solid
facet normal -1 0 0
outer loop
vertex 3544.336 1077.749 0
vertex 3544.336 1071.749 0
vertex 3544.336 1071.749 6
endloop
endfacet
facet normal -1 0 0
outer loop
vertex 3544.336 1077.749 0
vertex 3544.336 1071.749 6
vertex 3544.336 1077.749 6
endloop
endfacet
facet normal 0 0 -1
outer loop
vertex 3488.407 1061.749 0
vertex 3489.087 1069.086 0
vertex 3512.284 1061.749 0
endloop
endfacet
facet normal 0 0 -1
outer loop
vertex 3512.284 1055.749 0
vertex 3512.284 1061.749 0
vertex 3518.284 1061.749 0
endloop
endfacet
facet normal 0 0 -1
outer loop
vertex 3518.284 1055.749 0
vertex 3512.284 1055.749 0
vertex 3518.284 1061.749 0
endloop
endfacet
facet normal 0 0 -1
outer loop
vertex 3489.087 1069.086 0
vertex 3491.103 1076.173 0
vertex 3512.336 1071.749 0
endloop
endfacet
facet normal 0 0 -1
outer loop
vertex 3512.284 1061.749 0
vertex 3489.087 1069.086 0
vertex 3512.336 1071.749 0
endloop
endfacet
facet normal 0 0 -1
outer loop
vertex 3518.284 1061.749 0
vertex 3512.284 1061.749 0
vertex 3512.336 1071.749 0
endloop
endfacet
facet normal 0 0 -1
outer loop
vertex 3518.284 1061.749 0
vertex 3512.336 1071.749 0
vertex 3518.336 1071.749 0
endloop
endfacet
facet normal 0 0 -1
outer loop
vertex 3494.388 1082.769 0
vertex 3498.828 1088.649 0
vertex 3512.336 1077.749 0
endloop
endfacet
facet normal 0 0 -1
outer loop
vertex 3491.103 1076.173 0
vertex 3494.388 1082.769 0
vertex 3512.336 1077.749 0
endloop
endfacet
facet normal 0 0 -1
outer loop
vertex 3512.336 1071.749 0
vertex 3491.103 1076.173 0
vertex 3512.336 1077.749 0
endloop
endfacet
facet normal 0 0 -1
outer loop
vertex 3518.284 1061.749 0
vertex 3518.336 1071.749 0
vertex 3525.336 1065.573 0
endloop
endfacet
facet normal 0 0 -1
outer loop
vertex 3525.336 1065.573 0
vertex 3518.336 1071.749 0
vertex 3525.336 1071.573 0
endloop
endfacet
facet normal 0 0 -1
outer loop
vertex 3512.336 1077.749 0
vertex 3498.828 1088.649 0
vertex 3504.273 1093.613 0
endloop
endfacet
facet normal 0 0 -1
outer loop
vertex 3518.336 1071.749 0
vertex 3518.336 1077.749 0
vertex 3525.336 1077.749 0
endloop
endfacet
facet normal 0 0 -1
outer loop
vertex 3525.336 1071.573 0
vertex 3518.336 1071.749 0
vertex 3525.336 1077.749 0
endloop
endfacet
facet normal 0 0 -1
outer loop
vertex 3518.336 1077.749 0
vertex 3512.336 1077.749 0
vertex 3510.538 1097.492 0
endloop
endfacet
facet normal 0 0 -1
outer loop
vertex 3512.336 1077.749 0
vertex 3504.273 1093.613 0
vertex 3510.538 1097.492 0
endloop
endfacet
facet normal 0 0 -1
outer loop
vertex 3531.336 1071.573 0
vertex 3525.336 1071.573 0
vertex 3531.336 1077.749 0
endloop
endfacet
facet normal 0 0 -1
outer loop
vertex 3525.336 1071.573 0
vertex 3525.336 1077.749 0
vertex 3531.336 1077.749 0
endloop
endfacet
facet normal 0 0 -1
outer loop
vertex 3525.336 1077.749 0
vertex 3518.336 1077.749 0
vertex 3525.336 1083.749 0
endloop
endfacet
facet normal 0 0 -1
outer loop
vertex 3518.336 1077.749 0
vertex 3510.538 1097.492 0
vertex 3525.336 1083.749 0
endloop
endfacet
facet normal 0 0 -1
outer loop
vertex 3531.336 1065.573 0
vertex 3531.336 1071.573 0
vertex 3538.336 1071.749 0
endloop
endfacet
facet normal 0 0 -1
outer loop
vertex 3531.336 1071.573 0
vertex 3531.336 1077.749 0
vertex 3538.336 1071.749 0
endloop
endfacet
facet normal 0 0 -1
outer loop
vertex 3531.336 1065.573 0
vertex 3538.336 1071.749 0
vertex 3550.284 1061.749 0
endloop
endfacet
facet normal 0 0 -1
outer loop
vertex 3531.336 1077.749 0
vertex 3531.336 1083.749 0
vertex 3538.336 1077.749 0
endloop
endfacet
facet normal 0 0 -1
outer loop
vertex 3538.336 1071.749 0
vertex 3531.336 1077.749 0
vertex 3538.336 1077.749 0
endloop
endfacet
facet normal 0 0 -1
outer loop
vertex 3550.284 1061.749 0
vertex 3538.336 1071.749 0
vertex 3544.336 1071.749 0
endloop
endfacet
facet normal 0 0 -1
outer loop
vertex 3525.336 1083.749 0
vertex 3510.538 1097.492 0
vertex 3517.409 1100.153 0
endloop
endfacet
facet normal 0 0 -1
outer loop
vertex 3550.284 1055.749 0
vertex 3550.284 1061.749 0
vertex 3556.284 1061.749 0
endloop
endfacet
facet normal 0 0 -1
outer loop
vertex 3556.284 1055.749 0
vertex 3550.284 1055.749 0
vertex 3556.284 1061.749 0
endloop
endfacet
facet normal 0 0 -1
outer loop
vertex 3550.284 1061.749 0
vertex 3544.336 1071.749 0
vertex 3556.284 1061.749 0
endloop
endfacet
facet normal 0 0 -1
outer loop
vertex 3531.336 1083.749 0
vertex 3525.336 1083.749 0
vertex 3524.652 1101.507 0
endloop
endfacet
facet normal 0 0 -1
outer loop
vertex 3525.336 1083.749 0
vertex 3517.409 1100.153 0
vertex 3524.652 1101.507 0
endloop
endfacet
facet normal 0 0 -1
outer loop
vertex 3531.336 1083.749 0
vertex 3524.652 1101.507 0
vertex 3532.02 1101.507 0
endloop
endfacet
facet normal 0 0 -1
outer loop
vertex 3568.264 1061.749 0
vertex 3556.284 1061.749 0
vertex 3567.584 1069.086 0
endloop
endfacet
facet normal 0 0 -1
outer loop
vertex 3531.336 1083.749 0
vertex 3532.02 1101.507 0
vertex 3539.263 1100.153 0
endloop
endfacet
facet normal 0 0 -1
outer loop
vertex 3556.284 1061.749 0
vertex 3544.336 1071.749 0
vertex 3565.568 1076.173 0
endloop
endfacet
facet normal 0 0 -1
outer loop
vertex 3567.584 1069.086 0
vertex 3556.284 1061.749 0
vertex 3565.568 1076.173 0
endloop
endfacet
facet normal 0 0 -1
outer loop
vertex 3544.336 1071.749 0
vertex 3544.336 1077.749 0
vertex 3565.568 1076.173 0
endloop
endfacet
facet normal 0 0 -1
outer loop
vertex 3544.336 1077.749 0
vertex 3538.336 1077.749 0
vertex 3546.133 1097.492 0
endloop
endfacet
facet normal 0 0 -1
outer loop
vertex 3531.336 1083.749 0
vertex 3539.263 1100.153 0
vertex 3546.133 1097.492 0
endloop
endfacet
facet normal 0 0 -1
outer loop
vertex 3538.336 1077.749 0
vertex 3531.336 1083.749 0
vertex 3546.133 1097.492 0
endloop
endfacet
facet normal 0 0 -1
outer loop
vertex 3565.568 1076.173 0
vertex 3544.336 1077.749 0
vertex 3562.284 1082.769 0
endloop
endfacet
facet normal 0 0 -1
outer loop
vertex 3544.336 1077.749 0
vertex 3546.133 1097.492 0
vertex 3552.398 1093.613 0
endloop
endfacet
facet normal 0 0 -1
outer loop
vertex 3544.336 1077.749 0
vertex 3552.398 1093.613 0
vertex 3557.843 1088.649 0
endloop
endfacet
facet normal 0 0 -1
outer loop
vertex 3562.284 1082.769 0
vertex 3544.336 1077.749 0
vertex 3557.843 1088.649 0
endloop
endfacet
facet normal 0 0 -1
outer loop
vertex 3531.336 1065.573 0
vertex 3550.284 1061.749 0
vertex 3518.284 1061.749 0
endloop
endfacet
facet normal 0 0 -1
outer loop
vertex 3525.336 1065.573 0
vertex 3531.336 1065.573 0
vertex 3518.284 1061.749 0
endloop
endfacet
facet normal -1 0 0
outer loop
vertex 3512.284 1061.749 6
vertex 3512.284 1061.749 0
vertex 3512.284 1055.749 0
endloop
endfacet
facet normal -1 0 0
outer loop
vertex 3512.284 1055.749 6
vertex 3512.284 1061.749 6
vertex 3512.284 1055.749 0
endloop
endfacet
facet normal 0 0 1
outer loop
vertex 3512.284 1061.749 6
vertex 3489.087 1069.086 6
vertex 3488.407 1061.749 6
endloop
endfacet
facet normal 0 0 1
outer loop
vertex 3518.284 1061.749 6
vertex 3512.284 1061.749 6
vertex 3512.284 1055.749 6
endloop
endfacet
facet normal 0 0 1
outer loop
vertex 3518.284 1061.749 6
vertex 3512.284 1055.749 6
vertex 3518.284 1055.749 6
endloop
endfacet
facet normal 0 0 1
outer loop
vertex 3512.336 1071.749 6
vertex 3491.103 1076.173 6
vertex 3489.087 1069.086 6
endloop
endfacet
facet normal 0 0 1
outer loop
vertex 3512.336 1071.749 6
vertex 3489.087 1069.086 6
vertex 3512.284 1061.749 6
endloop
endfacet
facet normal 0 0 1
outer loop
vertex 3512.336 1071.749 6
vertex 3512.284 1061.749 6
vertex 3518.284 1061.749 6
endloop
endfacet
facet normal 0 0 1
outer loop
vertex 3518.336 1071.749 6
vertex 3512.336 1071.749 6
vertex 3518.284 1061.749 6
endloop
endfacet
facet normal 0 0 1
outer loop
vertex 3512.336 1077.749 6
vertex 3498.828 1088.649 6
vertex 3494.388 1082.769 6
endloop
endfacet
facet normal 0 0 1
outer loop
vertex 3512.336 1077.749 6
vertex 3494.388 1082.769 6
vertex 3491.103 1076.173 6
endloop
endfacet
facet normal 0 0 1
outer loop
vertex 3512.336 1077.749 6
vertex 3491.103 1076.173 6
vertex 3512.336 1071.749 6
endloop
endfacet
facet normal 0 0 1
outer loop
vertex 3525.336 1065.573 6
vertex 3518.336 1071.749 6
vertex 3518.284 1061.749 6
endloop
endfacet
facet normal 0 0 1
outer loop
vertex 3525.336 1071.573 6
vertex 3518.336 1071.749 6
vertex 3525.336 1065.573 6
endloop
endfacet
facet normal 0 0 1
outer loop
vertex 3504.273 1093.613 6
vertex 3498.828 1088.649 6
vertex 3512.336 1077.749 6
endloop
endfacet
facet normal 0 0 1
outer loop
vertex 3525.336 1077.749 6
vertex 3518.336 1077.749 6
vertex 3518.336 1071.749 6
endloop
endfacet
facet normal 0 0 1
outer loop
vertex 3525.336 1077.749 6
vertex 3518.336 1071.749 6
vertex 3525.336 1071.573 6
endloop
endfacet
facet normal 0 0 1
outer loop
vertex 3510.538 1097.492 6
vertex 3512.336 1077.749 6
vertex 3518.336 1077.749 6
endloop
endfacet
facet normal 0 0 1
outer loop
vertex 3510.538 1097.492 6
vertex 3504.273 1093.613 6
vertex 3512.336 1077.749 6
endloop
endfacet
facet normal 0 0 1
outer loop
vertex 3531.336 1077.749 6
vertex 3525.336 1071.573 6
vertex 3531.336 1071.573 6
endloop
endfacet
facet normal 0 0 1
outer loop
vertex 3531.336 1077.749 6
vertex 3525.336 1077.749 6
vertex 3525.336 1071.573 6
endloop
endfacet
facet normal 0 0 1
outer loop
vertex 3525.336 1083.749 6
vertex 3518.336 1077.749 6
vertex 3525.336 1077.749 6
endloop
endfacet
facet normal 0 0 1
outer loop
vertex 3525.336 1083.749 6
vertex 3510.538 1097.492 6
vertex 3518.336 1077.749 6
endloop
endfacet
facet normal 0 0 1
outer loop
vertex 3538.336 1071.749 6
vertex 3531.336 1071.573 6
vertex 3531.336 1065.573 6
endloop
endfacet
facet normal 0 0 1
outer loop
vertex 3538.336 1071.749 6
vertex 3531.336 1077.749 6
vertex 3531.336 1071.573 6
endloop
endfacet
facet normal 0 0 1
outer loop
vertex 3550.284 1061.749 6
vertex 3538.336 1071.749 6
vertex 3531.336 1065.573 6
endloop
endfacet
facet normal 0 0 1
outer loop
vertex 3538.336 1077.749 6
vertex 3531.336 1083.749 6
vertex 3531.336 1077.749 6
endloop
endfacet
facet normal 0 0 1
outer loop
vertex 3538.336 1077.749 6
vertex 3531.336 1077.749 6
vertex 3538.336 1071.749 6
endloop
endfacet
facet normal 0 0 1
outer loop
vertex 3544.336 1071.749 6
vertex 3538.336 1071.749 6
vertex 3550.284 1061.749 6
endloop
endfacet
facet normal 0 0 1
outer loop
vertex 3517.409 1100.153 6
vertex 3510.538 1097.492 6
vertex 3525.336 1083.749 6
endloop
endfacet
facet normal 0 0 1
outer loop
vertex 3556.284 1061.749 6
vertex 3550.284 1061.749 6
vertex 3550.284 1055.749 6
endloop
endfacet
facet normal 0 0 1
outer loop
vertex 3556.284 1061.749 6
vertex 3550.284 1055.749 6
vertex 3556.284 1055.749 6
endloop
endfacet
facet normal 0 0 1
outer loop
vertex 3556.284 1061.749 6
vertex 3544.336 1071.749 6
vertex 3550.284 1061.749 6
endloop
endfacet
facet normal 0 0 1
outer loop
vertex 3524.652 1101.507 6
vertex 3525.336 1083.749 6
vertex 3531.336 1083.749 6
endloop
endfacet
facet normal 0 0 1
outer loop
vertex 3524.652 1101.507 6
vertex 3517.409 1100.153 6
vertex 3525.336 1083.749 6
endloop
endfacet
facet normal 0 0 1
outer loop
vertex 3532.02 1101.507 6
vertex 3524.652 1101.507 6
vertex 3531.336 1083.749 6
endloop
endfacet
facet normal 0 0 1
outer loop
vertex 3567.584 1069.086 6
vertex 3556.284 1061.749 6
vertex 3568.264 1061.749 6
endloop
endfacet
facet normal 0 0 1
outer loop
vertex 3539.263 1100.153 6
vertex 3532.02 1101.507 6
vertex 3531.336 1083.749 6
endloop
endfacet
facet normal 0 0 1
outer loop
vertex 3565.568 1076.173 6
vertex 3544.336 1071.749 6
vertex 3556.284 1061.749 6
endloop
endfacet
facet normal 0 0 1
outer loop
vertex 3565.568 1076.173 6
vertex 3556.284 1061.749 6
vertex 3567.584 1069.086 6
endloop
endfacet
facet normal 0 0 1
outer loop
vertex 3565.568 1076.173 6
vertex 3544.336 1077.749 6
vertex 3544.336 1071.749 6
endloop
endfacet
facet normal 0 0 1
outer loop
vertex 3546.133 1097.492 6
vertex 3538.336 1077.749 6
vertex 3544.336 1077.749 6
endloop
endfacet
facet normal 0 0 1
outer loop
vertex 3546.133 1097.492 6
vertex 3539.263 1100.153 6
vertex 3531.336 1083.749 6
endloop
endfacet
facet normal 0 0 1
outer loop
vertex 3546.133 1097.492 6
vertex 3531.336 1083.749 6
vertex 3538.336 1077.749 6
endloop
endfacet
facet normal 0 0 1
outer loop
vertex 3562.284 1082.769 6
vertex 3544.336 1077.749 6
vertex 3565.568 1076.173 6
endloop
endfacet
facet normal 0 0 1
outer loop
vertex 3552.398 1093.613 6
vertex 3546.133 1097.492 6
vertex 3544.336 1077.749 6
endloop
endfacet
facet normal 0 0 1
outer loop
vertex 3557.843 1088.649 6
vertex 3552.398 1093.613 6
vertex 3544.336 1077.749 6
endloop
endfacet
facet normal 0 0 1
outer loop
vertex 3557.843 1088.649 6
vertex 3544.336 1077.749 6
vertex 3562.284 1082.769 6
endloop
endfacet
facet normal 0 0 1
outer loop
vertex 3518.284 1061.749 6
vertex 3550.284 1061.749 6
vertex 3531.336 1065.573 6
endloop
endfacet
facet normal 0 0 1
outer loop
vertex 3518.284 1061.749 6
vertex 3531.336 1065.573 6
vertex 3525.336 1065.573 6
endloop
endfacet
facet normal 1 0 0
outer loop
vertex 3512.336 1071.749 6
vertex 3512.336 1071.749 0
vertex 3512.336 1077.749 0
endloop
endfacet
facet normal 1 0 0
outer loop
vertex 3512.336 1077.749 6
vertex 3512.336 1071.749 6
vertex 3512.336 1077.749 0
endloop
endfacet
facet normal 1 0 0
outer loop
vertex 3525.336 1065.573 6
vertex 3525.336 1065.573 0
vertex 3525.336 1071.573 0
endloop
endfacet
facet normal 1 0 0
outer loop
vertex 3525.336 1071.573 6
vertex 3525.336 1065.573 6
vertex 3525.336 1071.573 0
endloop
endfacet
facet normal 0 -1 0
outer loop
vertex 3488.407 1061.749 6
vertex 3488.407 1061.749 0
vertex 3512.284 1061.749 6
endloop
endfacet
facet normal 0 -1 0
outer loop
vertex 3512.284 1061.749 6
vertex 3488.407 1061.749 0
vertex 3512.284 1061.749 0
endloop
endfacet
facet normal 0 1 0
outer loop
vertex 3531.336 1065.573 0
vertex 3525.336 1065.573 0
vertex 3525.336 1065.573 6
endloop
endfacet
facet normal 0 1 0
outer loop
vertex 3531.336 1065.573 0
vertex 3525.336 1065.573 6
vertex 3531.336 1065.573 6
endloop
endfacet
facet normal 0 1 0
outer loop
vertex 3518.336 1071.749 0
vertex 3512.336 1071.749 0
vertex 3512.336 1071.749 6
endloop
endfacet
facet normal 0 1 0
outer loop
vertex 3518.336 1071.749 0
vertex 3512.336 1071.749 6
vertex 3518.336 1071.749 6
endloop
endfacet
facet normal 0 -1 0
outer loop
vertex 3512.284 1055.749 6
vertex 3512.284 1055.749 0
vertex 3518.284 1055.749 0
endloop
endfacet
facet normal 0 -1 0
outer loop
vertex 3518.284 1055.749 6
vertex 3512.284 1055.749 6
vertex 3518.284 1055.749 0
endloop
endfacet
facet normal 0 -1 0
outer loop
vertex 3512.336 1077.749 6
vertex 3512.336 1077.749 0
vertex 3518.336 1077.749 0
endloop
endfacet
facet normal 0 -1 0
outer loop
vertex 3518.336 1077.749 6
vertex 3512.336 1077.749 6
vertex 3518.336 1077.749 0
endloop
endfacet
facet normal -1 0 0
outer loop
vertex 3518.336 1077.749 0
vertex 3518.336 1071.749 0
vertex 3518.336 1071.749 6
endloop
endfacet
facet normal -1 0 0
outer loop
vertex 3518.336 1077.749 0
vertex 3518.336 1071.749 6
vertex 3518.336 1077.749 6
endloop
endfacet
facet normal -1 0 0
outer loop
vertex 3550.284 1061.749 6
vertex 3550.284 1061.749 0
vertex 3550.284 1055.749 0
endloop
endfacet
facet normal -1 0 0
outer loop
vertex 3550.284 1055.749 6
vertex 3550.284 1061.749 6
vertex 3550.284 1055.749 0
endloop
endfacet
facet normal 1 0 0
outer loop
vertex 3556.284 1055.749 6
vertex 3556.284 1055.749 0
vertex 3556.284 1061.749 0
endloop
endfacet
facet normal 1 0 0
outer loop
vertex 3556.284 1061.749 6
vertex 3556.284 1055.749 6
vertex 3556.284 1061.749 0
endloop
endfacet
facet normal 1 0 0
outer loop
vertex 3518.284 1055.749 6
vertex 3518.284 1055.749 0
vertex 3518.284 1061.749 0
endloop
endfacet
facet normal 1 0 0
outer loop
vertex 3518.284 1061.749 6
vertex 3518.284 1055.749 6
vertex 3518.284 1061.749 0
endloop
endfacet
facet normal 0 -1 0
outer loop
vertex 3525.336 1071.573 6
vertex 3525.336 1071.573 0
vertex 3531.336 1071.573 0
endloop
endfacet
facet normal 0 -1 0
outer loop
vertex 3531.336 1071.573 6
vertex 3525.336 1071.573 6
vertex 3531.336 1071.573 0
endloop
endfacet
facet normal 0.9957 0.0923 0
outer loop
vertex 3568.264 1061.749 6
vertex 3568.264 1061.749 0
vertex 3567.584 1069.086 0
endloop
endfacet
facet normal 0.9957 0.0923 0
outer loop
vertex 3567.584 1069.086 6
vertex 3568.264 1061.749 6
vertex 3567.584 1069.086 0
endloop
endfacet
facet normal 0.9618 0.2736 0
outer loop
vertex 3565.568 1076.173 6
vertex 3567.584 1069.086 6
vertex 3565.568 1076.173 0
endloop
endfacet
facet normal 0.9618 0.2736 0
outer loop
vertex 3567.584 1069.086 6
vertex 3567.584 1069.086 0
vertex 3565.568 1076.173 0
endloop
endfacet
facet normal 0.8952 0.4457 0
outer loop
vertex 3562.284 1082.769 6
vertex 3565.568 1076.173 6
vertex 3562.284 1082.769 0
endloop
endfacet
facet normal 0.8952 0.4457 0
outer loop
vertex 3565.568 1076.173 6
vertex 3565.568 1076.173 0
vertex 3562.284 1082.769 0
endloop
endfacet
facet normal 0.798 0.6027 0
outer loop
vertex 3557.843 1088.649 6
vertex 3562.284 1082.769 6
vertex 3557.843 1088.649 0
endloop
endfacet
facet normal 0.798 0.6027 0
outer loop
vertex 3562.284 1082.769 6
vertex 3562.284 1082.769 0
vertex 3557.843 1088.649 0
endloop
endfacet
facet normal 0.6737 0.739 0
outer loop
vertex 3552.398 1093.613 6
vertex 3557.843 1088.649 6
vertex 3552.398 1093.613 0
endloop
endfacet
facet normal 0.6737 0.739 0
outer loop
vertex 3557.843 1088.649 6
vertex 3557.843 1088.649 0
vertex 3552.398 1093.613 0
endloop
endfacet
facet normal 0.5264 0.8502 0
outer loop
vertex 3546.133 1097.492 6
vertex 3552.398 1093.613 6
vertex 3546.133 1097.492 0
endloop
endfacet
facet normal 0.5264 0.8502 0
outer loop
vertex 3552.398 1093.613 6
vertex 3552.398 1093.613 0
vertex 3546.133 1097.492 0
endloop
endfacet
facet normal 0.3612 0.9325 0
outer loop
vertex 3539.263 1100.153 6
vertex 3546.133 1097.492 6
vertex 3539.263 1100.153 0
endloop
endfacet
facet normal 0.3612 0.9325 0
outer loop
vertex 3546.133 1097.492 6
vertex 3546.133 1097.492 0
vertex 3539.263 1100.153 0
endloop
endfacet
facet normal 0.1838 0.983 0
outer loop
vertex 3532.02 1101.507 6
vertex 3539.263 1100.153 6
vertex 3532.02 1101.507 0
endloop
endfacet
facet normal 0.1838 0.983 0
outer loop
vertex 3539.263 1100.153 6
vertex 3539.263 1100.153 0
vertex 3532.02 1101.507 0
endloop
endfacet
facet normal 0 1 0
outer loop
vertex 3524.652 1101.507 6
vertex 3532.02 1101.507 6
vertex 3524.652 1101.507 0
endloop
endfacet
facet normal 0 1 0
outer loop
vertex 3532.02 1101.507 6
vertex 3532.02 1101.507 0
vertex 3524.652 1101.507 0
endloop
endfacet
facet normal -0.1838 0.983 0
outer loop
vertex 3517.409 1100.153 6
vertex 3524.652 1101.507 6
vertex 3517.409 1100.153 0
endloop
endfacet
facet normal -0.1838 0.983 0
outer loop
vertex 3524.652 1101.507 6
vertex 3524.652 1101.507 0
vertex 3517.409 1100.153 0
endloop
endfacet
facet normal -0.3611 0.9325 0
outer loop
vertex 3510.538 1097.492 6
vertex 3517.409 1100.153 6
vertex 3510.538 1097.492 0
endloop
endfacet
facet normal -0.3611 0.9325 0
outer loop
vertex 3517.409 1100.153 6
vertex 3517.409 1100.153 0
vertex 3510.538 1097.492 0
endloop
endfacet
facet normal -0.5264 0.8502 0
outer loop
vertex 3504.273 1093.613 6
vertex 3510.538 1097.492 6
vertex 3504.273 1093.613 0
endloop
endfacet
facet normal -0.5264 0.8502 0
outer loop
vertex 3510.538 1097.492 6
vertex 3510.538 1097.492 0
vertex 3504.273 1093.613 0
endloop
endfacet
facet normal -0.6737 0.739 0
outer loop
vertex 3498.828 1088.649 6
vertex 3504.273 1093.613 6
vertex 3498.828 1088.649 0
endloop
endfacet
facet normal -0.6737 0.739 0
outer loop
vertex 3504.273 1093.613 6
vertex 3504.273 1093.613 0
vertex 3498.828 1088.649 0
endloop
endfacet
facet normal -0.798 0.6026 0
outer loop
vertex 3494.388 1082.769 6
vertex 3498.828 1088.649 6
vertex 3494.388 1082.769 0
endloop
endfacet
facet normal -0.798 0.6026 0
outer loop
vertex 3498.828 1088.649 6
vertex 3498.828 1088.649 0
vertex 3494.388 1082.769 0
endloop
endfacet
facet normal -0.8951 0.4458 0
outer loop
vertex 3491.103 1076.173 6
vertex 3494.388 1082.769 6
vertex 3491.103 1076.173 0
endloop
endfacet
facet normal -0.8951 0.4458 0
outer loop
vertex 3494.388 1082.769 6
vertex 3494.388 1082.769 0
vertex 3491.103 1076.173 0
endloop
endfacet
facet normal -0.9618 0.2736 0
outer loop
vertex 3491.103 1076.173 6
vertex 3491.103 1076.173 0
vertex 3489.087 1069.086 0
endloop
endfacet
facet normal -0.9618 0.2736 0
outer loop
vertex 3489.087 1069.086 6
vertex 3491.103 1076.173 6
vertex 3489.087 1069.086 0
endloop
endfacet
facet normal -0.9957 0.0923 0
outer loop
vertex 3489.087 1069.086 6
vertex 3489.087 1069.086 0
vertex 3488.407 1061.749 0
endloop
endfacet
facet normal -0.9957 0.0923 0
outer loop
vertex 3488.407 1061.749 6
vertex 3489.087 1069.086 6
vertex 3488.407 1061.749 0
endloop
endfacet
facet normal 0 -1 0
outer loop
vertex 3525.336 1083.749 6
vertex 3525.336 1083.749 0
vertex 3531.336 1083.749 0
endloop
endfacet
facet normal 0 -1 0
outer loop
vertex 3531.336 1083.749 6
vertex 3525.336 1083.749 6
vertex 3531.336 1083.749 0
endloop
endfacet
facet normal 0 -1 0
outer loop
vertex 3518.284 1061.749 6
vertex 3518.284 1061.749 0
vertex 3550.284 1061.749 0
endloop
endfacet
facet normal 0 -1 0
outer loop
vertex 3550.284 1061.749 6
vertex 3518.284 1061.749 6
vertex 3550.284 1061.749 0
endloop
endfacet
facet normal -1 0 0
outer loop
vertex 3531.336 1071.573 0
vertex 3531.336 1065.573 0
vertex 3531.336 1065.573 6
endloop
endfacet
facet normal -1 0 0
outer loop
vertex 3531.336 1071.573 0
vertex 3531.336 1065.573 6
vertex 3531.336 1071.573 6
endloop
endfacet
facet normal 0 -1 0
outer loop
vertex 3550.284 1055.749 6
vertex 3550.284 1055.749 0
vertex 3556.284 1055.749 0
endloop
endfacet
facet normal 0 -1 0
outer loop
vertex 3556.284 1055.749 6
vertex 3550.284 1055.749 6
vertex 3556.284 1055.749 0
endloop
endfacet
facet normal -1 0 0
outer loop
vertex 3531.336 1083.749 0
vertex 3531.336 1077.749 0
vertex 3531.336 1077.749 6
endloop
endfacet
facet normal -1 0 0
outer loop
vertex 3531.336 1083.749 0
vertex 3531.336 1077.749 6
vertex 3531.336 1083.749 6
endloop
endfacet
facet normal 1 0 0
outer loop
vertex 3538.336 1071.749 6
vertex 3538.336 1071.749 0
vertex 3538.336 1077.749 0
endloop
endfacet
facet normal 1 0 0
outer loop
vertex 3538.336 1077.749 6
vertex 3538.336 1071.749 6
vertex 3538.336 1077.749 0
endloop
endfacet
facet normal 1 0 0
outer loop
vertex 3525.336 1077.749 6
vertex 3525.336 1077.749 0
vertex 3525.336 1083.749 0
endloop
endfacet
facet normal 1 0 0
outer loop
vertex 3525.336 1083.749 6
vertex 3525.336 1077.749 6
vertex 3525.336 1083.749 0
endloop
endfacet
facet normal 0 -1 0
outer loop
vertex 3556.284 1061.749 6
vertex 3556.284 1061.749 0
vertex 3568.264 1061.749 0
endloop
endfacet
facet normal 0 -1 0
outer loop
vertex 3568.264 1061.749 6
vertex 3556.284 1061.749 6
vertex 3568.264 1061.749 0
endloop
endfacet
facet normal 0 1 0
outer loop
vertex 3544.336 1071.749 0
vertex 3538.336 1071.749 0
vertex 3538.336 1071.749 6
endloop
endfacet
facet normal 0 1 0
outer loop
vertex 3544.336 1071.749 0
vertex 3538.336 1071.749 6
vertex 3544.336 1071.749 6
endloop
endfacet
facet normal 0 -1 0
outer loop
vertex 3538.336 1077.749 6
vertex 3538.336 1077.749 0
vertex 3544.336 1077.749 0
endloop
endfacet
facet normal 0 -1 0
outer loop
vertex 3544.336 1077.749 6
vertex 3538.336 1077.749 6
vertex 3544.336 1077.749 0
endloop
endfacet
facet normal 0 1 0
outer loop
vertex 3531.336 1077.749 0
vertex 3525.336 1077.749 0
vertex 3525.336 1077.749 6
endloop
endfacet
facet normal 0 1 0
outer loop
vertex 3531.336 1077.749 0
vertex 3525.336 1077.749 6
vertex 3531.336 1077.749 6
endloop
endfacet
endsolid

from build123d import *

# Parameters (mm, degrees)
MODEL_W             = 6
MODEL_H             = 6
BOSS_EXTRUDE1_DEPTH = 6


with BuildPart() as part:
    # Model → Boss-Extrude1 (new body)
    with BuildSketch(Plane.XY):
        with BuildLine():
            Line((3550.284318909, 1061.748947436), (3550.284318909, 1055.748947436))
            Line((3550.284318909, 1055.748947436), (3556.284318909, 1055.748947436))
            Line((3556.284318909, 1055.748947436), (3556.284318909, 1061.748947436))
            Line((3556.284318909, 1061.748947436), (3568.264255366, 1061.748947436))
            ThreePointArc((3568.264255366, 1061.748947436), (3528.335683937, 1101.677518865), (3488.407112509, 1061.748947436))
            Line((3488.407112509, 1061.748947436), (3512.284318909, 1061.748947436))
            Line((3512.284318909, 1061.748947436), (3512.284318909, 1055.748947436))
            Line((3512.284318909, 1055.748947436), (3518.284318909, 1055.748947436))
            Line((3518.284318909, 1055.748947436), (3518.284318909, 1061.748947436))
            Line((3518.284318909, 1061.748947436), (3550.284318909, 1061.748947436))
        make_face()
        with Locations((3541.335683937, 1074.748947436)):
            Rectangle(MODEL_W, MODEL_H, mode=Mode.SUBTRACT)
        with Locations((3515.335683937, 1074.748947436)):
            Rectangle(MODEL_W, MODEL_H, mode=Mode.SUBTRACT)
        with Locations((3528.335683937, 1080.748947436)):
            Rectangle(MODEL_W, MODEL_H, mode=Mode.SUBTRACT)
        with Locations((3528.335683937, 1068.57340627)):
            Rectangle(MODEL_W, MODEL_H, mode=Mode.SUBTRACT)
    extrude(amount=BOSS_EXTRUDE1_DEPTH)


solid = part.part
